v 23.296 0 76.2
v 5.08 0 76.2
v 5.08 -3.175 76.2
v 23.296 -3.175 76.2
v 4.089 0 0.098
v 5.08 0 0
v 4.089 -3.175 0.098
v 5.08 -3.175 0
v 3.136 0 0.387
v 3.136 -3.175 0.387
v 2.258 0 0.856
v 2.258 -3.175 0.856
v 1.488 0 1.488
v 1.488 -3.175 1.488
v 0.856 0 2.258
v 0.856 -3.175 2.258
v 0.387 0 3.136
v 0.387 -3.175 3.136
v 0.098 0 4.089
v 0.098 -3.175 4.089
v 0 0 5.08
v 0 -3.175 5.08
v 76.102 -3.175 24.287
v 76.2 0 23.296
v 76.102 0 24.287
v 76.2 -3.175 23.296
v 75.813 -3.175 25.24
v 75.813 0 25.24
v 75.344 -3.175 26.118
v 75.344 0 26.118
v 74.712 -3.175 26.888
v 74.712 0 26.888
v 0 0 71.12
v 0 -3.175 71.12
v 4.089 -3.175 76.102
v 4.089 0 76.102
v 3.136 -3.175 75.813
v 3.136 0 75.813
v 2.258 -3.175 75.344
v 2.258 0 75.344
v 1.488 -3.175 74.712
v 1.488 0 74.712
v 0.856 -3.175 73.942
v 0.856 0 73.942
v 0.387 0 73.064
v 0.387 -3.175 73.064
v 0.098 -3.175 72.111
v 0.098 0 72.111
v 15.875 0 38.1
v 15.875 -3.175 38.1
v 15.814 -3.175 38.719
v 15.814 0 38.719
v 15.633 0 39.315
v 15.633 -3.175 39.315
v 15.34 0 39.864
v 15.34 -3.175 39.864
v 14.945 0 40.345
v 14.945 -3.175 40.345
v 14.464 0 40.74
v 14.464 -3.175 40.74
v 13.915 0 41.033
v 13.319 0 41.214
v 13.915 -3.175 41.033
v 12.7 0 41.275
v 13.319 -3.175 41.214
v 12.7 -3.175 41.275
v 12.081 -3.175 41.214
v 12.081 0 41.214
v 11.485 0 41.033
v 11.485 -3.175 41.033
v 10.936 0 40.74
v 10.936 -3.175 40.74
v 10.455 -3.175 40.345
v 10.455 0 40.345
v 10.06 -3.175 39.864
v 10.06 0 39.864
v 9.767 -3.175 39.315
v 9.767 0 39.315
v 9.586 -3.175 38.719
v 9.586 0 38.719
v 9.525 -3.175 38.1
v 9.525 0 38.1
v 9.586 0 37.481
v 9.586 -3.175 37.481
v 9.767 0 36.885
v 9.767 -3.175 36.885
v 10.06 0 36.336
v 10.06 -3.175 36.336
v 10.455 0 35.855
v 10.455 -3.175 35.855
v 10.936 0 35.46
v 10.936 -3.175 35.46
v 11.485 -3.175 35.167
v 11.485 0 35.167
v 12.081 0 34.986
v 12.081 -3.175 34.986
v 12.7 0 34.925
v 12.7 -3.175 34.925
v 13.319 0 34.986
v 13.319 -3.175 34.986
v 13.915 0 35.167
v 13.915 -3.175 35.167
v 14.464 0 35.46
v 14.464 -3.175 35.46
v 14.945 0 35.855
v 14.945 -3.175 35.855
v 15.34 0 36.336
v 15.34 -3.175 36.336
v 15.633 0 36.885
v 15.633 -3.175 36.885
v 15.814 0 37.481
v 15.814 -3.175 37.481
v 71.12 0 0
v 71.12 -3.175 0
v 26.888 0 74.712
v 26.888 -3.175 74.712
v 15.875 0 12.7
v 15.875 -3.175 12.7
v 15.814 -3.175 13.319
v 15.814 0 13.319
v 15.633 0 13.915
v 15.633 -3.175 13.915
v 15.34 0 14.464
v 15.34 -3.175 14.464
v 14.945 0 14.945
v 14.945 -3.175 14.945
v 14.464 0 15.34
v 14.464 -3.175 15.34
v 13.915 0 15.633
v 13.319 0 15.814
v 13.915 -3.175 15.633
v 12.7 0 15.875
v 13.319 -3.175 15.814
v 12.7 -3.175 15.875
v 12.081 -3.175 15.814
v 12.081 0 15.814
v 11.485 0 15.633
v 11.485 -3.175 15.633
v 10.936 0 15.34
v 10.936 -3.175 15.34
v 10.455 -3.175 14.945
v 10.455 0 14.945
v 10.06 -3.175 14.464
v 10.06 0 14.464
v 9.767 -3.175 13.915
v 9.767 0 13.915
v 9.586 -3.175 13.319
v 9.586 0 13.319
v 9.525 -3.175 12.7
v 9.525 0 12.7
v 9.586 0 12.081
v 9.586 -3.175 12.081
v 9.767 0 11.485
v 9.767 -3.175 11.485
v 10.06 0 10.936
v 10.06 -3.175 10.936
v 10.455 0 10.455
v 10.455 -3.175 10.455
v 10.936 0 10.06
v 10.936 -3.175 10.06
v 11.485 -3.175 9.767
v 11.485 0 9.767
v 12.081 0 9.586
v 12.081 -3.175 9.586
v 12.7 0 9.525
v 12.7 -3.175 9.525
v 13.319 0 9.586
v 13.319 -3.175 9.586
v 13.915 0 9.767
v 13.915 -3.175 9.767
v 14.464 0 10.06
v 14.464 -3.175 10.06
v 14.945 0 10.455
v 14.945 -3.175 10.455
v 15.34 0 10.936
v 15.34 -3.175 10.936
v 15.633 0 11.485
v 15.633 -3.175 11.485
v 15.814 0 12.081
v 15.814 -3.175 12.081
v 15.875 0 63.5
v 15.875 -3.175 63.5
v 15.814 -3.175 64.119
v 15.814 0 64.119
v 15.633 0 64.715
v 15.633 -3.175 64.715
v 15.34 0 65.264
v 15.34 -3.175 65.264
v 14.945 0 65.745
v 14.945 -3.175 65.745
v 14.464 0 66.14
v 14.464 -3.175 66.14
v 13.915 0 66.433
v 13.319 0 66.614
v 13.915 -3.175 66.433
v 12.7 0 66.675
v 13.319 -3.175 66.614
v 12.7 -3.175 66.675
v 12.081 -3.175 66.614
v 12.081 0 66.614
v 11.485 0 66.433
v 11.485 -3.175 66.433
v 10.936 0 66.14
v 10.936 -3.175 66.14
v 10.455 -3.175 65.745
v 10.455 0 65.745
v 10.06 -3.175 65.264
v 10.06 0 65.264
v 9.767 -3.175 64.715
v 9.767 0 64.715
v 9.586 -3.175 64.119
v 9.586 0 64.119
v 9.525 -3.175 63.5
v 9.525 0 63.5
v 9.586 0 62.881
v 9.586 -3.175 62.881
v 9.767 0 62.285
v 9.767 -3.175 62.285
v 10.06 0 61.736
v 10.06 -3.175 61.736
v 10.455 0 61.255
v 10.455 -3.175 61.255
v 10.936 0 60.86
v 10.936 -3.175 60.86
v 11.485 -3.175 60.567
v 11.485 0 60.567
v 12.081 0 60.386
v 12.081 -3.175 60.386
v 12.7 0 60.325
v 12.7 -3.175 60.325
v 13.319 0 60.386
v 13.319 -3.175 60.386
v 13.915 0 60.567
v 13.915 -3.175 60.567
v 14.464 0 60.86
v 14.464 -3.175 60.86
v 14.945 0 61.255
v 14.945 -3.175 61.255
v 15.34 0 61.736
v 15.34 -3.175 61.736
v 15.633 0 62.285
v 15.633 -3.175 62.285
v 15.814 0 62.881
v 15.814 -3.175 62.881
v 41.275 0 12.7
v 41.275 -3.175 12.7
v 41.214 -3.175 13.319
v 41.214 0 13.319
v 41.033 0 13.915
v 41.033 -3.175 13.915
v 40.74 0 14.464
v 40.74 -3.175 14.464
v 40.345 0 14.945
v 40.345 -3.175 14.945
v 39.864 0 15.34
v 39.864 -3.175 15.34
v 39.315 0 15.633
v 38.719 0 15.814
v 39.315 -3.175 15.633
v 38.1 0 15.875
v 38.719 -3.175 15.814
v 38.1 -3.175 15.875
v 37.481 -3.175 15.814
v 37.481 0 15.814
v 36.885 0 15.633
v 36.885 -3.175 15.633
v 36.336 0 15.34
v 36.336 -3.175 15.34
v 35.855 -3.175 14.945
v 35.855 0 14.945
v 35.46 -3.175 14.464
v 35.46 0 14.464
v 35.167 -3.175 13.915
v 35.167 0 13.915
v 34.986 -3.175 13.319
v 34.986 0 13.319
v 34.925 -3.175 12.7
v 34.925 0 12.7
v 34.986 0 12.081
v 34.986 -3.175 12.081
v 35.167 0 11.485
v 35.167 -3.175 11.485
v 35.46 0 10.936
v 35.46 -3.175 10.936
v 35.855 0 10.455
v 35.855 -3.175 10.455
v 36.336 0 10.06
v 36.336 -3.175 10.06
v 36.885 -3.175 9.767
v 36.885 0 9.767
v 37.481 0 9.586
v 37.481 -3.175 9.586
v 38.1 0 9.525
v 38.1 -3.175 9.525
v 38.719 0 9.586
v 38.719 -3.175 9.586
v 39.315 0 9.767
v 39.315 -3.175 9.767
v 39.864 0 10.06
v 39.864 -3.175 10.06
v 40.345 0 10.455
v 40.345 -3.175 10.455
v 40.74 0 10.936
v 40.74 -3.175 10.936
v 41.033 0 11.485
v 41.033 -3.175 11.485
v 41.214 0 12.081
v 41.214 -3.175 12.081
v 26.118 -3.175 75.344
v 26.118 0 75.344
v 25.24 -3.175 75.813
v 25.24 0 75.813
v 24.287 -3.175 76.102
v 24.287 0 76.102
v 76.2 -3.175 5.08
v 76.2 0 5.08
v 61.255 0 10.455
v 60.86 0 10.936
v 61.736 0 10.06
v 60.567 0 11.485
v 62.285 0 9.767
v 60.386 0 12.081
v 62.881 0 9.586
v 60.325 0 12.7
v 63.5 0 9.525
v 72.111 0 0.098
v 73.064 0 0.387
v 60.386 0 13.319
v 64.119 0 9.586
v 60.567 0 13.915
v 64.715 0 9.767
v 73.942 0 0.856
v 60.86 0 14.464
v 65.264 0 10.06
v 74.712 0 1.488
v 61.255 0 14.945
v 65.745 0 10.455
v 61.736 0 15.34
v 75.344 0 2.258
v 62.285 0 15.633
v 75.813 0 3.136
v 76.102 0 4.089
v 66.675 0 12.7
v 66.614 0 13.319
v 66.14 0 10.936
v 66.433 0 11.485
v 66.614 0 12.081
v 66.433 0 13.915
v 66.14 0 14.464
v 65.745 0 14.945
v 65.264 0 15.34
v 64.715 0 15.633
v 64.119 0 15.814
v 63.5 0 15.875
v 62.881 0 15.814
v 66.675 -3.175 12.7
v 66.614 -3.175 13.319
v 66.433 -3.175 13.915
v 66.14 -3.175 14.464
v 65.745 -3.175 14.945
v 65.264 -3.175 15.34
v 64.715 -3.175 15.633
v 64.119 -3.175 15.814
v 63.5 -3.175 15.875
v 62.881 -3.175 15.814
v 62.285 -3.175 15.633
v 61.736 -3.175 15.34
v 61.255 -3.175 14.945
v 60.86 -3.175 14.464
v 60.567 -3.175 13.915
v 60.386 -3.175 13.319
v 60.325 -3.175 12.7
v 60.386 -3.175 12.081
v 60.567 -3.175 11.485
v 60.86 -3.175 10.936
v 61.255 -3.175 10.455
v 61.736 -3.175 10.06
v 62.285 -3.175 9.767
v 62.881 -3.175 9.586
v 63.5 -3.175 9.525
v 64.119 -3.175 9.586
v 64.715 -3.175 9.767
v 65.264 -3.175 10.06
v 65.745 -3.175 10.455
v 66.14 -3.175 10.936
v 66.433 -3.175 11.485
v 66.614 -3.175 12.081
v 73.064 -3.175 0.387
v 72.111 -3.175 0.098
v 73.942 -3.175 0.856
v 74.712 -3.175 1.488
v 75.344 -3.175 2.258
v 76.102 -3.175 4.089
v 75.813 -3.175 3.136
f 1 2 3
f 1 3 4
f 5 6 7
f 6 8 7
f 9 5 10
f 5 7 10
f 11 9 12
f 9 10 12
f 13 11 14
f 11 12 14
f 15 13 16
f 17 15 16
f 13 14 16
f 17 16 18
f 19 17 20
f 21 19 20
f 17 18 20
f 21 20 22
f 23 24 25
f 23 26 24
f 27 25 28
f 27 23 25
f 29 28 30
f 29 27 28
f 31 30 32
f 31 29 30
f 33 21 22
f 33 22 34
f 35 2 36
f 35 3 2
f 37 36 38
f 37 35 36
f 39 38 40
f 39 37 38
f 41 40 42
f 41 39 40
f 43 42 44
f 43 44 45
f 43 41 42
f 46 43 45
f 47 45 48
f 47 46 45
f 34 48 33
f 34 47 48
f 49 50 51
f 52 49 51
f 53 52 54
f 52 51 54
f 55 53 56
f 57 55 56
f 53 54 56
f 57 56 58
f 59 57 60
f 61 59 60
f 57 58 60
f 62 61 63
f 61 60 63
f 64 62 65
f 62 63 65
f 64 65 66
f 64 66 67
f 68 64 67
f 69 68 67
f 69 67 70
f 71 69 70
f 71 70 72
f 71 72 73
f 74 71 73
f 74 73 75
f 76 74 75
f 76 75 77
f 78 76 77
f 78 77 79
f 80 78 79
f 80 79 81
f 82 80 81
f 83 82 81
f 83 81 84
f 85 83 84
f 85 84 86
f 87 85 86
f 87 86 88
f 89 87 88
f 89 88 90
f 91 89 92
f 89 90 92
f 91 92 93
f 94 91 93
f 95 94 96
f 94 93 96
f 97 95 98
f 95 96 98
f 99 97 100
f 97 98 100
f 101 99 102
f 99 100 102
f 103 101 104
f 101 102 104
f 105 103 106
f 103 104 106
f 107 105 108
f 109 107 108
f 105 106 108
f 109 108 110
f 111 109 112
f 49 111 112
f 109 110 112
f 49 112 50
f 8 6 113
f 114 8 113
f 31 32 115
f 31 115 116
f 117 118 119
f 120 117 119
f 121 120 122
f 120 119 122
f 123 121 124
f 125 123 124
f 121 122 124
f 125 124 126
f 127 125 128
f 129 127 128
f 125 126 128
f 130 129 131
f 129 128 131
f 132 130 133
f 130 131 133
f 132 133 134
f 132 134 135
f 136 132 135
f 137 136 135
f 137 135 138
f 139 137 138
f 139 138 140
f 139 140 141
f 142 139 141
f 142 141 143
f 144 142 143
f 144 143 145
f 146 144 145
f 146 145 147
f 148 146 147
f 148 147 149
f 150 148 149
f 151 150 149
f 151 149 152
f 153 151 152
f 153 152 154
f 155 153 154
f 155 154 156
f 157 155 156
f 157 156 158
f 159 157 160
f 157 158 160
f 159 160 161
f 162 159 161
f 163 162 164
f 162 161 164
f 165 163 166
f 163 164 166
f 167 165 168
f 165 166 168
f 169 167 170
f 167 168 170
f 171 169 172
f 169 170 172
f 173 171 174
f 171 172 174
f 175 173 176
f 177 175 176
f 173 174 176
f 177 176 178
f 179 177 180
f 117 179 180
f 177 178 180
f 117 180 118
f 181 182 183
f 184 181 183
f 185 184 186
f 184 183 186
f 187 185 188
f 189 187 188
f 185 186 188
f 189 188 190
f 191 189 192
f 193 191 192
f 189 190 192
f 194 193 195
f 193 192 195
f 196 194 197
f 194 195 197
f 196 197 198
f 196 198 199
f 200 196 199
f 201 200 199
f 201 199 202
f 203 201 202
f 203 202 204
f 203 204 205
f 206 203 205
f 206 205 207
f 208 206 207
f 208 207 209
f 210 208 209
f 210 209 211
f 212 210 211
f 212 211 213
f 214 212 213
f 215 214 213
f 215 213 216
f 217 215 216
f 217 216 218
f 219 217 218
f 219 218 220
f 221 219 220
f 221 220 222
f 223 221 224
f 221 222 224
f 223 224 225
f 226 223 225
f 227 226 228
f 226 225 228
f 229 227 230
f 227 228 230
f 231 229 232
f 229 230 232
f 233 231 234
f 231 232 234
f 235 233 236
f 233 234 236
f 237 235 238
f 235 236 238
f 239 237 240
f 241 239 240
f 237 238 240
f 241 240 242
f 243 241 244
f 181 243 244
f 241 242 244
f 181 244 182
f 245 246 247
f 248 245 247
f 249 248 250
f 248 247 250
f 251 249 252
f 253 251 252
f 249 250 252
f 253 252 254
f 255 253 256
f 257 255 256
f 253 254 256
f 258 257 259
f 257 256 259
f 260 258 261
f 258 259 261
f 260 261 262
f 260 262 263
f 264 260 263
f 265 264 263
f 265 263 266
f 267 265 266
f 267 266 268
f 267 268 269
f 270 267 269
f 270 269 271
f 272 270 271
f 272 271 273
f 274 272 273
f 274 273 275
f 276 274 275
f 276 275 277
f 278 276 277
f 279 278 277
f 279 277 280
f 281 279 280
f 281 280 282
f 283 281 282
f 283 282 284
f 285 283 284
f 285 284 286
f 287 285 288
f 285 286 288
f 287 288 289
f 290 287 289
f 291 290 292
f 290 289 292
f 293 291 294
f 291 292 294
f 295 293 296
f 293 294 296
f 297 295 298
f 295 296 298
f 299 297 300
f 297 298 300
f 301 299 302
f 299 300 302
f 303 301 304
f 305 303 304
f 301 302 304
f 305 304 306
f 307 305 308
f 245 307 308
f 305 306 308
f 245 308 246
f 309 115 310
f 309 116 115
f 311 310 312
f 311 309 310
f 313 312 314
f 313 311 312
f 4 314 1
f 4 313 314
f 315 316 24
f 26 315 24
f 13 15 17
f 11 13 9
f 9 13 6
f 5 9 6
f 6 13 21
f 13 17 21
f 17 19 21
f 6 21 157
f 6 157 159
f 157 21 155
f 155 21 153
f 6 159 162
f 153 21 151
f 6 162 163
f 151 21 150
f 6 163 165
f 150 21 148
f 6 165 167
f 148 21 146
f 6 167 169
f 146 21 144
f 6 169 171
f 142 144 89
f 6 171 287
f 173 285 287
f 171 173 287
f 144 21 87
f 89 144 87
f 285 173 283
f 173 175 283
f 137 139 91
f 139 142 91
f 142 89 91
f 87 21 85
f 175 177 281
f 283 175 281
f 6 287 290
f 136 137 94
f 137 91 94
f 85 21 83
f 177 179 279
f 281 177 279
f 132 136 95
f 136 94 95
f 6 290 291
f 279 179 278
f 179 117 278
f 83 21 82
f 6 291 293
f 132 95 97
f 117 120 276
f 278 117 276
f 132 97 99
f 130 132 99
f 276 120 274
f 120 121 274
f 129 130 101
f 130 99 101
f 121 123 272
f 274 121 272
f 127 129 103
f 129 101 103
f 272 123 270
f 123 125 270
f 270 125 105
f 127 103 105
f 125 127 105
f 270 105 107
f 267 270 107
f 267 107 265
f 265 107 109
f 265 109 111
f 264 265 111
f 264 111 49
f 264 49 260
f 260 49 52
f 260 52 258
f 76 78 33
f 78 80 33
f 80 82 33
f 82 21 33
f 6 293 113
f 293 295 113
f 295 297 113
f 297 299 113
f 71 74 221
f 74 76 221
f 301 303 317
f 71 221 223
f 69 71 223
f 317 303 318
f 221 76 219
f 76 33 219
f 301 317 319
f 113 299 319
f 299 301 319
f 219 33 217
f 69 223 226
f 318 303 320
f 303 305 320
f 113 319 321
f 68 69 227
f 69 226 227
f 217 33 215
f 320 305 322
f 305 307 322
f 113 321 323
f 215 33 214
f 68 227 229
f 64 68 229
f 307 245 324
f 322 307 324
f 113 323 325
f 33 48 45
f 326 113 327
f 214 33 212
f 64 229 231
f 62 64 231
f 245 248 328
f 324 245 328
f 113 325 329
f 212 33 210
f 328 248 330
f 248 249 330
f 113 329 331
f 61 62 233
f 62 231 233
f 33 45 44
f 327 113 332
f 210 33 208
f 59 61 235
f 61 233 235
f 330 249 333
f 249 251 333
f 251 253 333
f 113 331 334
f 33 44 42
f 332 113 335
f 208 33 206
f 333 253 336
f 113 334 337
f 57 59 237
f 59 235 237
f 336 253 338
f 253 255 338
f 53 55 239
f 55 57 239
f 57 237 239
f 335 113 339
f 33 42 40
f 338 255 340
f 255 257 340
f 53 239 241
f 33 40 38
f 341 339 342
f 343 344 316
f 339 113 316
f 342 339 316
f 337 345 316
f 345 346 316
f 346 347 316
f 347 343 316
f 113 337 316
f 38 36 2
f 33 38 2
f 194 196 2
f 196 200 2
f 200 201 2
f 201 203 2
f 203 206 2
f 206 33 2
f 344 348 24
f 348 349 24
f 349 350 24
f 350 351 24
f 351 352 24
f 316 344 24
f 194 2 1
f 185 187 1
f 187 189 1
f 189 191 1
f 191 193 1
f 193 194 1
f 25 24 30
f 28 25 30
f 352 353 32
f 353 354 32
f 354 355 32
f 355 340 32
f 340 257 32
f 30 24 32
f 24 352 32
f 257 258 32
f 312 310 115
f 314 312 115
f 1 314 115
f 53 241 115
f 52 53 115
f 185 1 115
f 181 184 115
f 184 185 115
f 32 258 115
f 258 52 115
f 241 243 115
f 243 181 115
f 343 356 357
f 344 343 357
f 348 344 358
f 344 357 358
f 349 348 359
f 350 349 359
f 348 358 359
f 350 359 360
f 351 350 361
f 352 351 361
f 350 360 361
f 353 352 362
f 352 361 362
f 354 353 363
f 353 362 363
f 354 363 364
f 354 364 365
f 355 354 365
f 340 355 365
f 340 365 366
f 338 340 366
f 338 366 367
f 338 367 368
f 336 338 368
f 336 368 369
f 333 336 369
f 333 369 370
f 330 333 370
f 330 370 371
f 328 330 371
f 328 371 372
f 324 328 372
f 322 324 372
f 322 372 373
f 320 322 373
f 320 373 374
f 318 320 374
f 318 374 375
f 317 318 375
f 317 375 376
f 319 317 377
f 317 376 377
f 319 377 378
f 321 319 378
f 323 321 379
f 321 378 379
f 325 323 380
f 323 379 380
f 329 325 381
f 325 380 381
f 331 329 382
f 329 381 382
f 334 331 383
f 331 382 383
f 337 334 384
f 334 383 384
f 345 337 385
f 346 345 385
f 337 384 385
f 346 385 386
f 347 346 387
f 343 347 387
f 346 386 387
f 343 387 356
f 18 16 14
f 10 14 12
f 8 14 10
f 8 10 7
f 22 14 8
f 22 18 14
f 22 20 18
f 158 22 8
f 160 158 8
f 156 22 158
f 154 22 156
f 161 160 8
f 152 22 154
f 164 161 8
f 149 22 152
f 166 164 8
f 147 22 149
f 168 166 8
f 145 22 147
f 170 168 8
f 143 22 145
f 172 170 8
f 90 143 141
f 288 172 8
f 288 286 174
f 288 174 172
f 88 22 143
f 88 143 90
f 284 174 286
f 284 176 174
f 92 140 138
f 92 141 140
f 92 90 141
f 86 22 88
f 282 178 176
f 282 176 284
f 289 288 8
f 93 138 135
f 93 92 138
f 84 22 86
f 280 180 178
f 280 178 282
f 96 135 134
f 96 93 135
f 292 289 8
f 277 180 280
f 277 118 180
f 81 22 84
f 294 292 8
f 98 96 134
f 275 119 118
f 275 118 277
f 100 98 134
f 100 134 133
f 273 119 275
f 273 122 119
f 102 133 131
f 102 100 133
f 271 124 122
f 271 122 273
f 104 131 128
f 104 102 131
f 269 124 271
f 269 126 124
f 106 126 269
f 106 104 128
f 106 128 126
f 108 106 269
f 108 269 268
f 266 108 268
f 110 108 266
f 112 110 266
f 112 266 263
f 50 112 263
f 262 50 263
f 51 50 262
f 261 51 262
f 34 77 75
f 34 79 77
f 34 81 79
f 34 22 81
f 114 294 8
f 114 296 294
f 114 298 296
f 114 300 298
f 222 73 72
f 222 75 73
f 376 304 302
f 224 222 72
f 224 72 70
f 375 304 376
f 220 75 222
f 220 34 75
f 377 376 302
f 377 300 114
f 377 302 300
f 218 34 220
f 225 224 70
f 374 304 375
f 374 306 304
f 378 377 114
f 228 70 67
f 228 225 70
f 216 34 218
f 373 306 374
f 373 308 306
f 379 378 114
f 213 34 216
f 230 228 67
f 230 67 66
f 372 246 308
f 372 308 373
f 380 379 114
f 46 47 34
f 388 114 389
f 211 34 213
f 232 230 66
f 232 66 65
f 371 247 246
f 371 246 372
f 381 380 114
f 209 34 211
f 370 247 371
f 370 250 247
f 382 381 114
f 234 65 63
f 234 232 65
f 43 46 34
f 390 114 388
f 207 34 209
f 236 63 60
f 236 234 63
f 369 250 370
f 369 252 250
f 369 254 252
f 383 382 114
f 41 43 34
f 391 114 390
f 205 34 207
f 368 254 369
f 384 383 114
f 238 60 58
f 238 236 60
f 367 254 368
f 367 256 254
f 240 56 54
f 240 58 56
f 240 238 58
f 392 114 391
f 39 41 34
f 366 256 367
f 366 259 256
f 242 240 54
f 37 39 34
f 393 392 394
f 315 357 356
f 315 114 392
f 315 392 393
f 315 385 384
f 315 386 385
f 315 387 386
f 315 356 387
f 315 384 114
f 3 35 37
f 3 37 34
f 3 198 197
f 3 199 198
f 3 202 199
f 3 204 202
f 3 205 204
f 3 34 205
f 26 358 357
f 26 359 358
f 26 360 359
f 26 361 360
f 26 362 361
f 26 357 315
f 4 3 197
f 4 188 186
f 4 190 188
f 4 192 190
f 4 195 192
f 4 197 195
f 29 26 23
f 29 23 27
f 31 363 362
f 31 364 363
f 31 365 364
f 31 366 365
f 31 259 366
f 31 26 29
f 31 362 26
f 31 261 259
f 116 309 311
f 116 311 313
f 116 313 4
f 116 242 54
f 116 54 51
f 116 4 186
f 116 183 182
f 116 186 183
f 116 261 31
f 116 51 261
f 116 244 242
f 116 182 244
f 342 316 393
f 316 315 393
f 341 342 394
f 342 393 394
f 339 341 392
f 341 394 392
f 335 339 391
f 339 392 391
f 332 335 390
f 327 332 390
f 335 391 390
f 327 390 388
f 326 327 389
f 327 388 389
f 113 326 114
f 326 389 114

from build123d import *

# Parameters (mm, degrees)
F0_W     = 76.2
F0_H     = 76.2
F1_DEPTH = 3.175
F2_SIZE  = 50.8
F3_R     = 5.08
F5_D     = 6.35


with BuildPart() as f1:
    # F0 (on Front) → F1 (new body)
    with BuildSketch(Plane.XZ):
        with Locations((38.1, 38.1)):
            Rectangle(F0_W, F0_H)
    extrude(amount=F1_DEPTH)

    # F2
    f2_edges = [f1.edges().sort_by_distance(p)[0] for p in [
        (76.2, -1.5875, 76.2),
    ]]
    chamfer(f2_edges, length=F2_SIZE)

    # F3
    f3_edges = [f1.edges().sort_by_distance(p)[0] for p in [
        (0, -1.5875, 76.2),
        (25.4, -1.5875, 76.2),
        (76.2, -1.5875, 25.4),
        (76.2, -1.5875, 0),
        (0, -1.5875, 0),
    ]]
    fillet(f3_edges, radius=F3_R)

    # F5 (through all)
    with Locations(Plane(origin=(0, 0, 0), x_dir=(-1, 0, 0), z_dir=(0, 1, 0))):
        with Locations((-12.7, 12.7), (-12.7, 38.1), (-12.7, 63.5), (-38.1, 12.7), (-63.5, 12.7)):
            Hole(F5_D / 2)


solid = f1.part
